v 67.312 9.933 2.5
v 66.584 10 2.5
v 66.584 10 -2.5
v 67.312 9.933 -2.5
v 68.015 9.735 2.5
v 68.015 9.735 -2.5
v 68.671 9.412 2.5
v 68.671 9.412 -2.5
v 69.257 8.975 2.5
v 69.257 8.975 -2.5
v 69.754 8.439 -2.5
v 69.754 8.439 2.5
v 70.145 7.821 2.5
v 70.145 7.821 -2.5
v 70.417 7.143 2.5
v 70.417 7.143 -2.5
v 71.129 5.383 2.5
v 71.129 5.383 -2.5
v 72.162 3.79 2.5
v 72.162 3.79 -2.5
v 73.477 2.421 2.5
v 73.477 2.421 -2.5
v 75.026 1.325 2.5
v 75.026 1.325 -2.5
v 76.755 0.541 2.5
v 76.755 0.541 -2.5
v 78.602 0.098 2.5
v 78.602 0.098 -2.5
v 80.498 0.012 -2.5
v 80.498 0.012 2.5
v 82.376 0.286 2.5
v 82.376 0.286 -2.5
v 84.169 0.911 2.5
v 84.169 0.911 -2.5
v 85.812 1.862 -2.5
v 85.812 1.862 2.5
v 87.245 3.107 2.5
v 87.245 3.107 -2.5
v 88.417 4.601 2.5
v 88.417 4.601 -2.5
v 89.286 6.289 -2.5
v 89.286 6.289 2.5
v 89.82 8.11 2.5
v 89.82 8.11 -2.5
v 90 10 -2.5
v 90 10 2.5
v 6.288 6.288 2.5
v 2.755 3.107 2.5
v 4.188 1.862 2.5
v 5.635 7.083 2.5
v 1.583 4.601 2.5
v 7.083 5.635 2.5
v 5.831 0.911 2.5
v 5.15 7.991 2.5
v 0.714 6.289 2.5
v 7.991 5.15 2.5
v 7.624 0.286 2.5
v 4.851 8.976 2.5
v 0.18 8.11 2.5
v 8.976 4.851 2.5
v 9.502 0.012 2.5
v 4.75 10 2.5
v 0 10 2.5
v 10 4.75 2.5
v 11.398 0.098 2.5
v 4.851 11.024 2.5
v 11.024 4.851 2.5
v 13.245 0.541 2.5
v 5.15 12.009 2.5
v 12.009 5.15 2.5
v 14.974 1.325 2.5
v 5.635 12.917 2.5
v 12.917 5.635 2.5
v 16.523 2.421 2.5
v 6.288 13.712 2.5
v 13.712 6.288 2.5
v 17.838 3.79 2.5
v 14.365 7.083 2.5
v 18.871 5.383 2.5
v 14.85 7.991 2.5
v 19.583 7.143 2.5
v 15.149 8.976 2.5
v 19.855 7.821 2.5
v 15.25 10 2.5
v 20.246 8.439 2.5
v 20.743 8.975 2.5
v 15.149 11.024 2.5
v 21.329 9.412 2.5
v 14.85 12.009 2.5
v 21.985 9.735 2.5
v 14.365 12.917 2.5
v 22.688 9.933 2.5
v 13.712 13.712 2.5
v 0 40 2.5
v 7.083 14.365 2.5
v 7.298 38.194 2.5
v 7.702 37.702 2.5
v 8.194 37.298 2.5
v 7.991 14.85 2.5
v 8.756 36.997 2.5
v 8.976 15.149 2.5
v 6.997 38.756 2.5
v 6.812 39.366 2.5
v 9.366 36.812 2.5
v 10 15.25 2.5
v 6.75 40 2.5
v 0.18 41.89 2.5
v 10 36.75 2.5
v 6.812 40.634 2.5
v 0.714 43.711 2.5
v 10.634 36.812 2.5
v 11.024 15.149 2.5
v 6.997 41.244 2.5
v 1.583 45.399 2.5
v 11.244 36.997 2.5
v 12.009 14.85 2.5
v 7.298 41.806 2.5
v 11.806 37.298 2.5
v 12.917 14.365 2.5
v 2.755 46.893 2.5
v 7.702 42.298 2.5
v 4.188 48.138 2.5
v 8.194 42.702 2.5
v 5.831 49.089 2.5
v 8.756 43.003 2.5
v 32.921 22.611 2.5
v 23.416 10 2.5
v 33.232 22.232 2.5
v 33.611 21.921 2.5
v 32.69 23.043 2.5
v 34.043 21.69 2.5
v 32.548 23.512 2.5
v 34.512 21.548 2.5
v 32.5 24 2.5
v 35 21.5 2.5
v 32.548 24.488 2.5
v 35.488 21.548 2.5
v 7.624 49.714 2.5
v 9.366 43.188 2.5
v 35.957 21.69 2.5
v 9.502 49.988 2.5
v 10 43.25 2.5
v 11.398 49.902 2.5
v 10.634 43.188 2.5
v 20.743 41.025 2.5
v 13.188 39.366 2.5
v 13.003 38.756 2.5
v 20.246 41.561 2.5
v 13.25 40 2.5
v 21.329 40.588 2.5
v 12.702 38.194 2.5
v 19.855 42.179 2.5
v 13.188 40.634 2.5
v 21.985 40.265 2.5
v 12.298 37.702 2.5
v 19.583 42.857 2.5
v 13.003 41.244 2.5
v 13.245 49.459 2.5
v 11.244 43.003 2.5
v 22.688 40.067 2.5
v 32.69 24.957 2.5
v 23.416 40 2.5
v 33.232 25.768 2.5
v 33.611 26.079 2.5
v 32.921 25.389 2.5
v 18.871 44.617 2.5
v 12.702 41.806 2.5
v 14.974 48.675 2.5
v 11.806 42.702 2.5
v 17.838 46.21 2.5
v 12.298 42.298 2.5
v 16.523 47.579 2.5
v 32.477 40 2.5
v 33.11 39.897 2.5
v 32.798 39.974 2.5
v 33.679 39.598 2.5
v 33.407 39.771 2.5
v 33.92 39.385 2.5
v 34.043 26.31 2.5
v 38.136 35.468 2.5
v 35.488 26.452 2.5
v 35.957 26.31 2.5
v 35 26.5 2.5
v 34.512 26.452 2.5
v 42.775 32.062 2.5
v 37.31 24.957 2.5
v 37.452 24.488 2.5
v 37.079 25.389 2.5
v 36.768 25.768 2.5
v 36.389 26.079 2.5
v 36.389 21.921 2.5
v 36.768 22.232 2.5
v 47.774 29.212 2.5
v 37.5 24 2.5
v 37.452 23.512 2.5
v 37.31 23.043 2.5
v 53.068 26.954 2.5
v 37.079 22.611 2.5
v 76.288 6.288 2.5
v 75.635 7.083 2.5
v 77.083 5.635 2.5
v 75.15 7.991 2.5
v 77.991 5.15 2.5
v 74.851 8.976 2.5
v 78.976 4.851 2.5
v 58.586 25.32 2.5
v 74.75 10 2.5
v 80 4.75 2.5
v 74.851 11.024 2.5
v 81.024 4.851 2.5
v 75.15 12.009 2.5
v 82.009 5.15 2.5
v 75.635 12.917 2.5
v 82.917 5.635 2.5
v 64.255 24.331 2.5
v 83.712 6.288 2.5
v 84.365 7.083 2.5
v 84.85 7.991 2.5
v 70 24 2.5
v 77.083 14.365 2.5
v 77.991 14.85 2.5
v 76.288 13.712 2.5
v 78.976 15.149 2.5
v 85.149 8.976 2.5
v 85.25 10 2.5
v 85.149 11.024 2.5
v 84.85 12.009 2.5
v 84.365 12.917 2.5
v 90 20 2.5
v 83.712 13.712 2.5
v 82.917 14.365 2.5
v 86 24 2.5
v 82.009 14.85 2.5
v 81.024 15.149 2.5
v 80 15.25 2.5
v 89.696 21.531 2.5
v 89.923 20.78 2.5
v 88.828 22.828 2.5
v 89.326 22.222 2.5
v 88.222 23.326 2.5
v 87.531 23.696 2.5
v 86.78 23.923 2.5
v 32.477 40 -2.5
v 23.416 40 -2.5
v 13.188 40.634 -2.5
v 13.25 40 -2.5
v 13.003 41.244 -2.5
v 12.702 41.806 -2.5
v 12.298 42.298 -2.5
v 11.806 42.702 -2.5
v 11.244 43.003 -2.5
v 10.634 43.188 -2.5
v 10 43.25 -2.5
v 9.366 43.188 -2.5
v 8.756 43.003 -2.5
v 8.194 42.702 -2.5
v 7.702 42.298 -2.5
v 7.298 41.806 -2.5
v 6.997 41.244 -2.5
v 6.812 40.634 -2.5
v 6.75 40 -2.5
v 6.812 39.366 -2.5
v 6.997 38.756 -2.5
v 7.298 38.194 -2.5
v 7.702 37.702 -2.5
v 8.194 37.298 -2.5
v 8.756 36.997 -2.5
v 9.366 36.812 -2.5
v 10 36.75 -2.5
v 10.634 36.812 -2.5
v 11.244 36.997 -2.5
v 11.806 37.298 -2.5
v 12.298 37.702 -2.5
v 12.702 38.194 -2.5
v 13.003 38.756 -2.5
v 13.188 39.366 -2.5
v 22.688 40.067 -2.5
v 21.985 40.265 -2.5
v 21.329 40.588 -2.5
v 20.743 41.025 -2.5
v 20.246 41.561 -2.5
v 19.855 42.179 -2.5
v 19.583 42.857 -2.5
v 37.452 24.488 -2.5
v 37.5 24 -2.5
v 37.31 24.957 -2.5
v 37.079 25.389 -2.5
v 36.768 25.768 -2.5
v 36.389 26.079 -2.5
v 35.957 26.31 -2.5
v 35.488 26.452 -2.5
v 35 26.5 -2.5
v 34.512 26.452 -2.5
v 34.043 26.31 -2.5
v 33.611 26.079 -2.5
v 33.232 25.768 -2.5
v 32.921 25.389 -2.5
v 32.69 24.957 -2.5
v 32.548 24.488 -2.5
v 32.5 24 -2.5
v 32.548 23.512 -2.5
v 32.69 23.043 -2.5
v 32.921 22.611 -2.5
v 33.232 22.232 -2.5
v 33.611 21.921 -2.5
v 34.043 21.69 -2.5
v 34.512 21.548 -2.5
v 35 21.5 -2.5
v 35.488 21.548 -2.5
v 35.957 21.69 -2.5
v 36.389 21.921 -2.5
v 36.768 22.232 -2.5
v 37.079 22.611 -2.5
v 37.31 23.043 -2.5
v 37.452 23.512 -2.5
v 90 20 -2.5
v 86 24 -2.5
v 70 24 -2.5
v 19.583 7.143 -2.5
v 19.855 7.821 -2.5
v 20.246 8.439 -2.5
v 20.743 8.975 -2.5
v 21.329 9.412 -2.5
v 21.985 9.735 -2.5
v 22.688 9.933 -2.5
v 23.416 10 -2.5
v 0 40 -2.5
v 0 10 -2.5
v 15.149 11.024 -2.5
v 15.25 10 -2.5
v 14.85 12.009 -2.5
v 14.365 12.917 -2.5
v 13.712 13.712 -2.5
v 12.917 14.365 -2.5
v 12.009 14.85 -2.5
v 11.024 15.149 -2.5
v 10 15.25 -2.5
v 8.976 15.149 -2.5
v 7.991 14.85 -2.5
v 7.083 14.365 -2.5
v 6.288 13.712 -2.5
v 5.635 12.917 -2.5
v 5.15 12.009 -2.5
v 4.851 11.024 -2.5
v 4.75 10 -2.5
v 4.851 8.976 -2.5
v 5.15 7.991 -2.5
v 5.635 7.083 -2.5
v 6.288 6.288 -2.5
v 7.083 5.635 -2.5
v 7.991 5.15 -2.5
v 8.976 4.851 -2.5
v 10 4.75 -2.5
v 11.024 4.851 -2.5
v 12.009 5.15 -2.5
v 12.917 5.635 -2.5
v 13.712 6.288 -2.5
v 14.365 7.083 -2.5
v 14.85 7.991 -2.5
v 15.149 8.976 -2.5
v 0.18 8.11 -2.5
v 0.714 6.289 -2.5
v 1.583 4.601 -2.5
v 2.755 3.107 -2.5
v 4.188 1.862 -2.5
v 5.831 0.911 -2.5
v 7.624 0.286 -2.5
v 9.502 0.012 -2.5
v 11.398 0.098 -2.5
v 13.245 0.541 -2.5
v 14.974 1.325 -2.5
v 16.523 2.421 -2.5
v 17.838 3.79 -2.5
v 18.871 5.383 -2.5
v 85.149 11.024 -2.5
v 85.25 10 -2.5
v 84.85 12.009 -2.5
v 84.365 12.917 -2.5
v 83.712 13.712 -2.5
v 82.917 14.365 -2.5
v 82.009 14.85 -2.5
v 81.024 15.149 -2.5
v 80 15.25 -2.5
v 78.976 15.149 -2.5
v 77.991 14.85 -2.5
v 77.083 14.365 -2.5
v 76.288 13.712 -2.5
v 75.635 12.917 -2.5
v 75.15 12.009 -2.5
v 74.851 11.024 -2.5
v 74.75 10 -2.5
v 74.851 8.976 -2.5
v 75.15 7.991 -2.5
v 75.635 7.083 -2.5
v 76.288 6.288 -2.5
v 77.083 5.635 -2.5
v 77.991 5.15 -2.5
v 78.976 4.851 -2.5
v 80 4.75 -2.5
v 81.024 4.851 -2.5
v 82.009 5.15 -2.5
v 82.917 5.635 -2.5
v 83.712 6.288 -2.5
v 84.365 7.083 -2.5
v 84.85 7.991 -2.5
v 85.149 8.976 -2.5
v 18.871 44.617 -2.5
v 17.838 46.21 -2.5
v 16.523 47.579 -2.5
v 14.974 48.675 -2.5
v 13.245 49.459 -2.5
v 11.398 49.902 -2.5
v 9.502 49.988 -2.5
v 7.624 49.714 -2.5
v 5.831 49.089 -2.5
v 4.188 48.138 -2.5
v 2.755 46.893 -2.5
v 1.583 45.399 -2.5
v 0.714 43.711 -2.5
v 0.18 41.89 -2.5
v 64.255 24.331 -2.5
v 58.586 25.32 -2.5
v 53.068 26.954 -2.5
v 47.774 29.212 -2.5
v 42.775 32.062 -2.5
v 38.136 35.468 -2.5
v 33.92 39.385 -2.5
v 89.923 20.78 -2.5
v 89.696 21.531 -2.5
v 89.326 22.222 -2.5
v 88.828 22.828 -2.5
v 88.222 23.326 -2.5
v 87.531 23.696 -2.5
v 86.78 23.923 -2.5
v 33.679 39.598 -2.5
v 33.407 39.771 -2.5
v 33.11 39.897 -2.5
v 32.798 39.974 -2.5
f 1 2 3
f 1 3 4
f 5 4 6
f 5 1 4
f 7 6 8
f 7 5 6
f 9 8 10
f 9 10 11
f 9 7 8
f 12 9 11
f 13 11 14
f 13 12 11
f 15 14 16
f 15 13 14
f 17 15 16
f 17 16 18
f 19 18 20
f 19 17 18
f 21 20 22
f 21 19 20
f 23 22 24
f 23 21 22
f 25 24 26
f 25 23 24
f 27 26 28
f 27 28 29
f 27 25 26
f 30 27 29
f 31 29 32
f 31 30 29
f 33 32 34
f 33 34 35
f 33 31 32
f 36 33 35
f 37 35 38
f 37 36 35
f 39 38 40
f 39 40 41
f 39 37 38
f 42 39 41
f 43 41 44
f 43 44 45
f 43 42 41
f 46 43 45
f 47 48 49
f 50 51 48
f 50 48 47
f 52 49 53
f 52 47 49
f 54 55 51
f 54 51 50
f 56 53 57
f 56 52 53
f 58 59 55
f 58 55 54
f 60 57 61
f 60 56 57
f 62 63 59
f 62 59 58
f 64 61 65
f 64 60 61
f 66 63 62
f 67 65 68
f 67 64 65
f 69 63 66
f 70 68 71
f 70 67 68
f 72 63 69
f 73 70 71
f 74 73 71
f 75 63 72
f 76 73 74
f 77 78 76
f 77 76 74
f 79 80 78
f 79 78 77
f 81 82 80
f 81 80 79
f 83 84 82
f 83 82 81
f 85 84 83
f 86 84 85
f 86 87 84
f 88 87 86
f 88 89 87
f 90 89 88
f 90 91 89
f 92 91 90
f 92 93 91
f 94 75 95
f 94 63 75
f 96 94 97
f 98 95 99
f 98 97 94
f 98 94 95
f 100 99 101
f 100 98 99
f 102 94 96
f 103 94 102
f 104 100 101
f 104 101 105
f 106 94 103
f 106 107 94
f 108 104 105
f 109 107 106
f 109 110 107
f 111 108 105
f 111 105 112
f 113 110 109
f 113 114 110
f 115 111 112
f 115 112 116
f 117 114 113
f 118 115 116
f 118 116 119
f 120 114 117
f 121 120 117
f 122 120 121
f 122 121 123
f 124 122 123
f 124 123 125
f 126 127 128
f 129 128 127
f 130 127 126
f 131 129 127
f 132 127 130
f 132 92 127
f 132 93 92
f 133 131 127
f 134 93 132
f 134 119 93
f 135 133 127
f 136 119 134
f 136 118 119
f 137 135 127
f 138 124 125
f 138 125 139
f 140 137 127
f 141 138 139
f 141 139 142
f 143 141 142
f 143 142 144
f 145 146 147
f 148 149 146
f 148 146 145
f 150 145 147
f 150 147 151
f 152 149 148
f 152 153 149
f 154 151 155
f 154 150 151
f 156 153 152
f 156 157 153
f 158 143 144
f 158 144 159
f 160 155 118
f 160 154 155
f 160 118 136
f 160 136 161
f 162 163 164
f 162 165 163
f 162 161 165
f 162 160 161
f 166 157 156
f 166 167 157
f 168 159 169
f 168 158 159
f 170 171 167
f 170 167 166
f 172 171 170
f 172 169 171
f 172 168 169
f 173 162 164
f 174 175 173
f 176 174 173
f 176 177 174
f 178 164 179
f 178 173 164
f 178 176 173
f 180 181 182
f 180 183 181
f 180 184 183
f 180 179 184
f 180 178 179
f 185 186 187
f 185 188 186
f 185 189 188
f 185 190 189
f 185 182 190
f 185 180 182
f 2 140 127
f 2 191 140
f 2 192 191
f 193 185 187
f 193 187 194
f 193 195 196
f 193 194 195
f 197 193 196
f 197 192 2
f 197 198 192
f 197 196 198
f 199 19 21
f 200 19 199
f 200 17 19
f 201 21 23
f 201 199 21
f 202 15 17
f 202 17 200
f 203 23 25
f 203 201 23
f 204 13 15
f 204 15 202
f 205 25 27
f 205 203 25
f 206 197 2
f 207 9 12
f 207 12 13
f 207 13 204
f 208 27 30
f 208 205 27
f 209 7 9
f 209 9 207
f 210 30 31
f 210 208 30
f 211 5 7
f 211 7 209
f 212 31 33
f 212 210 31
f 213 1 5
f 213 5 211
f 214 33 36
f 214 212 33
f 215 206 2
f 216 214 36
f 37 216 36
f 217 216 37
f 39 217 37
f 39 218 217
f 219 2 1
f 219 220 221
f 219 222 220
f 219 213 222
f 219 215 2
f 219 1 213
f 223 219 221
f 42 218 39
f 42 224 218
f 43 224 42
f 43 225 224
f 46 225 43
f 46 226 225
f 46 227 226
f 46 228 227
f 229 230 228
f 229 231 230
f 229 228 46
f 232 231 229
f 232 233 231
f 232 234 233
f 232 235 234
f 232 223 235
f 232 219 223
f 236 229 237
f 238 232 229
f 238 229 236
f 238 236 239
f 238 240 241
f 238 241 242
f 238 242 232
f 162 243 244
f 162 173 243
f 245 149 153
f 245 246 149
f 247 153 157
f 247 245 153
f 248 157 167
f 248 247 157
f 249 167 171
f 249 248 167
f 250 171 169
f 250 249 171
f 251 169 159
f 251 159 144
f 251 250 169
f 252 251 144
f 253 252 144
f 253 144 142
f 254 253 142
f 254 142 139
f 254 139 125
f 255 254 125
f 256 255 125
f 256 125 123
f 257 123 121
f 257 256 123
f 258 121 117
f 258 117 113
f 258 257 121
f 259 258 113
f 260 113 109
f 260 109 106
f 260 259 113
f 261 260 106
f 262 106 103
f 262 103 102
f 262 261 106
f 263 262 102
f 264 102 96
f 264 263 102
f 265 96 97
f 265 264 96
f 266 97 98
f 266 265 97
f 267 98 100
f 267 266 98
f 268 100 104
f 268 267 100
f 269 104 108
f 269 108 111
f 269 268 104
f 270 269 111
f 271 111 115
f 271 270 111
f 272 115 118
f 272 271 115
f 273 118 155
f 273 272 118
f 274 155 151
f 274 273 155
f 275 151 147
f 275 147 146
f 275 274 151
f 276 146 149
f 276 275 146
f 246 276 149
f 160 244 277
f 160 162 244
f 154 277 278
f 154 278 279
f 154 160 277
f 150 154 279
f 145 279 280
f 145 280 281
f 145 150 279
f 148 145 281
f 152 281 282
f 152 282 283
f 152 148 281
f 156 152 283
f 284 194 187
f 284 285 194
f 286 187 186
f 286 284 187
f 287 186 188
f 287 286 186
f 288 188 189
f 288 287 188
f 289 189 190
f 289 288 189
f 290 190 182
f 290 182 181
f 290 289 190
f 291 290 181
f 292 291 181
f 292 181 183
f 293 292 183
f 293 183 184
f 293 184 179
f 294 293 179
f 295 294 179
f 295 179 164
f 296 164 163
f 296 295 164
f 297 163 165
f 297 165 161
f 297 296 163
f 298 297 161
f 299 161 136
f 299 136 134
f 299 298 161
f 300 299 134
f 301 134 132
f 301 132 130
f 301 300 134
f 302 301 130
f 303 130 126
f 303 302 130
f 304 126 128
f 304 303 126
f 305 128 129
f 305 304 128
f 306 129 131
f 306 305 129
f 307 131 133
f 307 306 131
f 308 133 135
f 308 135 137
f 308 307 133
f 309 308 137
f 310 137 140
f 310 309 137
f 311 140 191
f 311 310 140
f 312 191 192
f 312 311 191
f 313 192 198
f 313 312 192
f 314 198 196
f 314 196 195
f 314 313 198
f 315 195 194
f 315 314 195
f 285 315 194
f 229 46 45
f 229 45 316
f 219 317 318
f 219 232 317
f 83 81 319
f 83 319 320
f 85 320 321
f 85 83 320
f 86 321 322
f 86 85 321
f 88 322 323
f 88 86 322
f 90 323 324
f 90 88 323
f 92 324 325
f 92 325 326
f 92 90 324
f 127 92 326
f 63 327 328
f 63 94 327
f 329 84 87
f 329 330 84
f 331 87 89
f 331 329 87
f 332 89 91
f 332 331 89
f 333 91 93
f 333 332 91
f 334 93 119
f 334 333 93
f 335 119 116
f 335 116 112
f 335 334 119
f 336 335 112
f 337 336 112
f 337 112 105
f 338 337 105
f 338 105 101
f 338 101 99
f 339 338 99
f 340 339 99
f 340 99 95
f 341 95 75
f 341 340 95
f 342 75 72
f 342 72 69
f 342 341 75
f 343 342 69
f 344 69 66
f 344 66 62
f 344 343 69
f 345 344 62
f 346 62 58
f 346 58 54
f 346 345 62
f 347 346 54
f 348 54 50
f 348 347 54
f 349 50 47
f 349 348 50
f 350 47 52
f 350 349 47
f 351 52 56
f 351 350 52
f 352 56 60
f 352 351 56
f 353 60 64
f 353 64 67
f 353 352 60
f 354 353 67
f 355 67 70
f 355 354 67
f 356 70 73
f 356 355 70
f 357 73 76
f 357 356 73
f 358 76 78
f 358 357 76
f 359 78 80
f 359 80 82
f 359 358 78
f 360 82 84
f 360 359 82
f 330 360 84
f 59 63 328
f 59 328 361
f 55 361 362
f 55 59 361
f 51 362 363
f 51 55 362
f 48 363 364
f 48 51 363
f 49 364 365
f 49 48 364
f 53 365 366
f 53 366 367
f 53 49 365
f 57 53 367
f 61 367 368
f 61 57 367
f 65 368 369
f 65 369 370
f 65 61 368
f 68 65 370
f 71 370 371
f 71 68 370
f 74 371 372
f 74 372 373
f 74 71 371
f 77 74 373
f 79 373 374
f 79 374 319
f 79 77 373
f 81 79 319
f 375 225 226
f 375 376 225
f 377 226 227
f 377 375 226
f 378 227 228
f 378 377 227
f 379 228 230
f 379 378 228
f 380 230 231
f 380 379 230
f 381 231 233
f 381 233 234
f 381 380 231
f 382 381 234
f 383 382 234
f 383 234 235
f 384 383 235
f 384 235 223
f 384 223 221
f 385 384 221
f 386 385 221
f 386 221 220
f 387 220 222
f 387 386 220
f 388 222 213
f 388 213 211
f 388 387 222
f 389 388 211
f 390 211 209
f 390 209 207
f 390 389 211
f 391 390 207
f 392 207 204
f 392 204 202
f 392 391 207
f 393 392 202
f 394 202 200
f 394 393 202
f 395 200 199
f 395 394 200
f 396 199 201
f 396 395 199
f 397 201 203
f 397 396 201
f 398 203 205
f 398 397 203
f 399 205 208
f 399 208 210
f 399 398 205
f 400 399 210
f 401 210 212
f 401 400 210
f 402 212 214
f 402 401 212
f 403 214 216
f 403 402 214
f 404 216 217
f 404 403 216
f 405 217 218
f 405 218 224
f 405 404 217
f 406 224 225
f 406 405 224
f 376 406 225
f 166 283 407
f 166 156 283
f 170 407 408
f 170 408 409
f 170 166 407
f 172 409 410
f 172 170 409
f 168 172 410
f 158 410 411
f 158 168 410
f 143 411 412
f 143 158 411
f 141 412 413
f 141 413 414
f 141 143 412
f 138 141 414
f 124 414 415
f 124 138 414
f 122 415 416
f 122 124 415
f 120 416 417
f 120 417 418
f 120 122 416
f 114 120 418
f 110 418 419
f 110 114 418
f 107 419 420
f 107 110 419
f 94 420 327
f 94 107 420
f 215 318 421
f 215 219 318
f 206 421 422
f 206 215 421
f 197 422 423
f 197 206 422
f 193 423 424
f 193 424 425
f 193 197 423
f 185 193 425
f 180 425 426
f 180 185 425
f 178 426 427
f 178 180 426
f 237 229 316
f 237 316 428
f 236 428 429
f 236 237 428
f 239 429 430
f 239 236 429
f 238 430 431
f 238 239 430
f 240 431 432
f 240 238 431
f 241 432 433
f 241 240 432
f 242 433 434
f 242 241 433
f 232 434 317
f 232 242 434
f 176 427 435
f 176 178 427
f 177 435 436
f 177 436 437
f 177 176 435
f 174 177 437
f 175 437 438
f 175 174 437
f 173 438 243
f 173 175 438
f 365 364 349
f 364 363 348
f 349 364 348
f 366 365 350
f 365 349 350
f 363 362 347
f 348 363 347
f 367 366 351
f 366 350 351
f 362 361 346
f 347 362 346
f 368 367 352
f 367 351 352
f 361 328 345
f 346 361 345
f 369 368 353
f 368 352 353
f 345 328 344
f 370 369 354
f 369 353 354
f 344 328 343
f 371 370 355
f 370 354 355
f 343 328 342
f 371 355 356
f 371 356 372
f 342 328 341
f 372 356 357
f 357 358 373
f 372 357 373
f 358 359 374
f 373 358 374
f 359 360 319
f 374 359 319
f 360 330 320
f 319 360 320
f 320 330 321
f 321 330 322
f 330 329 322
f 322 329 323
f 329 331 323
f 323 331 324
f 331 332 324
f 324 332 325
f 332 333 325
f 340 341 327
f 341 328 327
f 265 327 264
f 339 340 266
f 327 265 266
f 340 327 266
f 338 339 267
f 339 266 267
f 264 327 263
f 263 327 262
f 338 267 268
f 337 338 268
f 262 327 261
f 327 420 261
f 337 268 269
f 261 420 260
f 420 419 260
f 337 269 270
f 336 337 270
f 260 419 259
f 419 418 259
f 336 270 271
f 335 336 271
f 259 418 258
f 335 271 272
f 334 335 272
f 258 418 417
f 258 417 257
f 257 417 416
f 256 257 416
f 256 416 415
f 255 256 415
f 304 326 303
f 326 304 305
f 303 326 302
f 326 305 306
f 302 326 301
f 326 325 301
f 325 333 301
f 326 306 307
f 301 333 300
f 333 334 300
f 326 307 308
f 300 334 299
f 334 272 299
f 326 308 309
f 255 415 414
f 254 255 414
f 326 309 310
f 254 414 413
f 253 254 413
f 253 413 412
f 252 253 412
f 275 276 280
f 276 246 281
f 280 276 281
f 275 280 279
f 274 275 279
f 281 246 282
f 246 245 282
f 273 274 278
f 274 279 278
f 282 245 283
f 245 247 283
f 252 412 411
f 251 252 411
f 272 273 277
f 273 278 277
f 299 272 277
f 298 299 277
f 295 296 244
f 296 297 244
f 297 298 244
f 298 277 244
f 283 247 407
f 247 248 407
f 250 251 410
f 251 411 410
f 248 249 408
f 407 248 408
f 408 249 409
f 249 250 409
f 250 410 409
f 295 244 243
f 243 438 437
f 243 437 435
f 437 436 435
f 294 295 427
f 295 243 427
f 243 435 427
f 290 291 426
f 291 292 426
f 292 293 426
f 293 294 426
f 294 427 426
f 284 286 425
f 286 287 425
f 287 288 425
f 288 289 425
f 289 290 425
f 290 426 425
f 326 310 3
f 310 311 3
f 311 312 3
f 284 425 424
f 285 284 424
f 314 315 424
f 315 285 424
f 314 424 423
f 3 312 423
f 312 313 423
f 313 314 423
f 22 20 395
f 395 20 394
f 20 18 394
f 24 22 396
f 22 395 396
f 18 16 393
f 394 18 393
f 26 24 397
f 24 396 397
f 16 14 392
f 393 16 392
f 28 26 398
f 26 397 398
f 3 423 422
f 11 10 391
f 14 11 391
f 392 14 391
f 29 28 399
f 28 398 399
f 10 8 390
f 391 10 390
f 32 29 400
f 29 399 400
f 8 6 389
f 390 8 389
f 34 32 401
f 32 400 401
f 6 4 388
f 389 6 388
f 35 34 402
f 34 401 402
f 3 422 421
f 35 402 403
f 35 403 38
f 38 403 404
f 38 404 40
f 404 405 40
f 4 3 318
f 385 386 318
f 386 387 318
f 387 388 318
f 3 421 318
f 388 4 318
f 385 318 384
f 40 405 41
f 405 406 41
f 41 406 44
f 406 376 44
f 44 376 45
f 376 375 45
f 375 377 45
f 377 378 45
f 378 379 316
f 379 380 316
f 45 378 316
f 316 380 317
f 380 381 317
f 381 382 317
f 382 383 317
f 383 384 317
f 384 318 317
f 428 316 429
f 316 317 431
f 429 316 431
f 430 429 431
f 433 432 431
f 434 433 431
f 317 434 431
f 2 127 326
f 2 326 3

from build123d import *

# Parameters (mm, degrees)
SKETCH2_R           = 3.25
SKETCH2_R_2         = 5.25
SKETCH2_R_3         = 2.5
BOSS_EXTRUDE1_DEPTH = 2.5


with BuildPart() as part:
    # Sketch2 → Boss-Extrude1 (new, symmetric)
    with BuildSketch(Plane.XY):
        with BuildLine():
            Line((0, 40), (0, 10))
            ThreePointArc((0, 10), (8.556304179, 0.104761631), (19.583148475, 7.142857143))
            ThreePointArc((19.583148475, 7.142857143), (21.025950646, 9.207134903), (23.416407865, 10))
            Line((23.416407865, 10), (66.583592135, 10))
            ThreePointArc((66.583592135, 10), (68.974049354, 9.207134903), (70.416851525, 7.142857143))
            ThreePointArc((70.416851525, 7.142857143), (81.443695821, 0.104761631), (90, 10))
            Line((90, 10), (90, 20))
            ThreePointArc((90, 20), (88.828427125, 22.828427125), (86, 24))
            Line((86, 24), (70, 24))
            ThreePointArc((70, 24), (50.388386486, 28.00668945), (33.919878771, 39.384615385))
            ThreePointArc((33.919878771, 39.384615385), (33.261138462, 39.839732422), (32.476673921, 40))
            Line((32.476673921, 40), (23.416407865, 40))
            ThreePointArc((23.416407865, 40), (21.025950646, 40.792865097), (19.583148475, 42.857142857))
            ThreePointArc((19.583148475, 42.857142857), (8.556304179, 49.895238369), (0, 40))
        make_face()
        with Locations((10, 40)):
            Circle(SKETCH2_R, mode=Mode.SUBTRACT)
        with Locations((10, 10)):
            Circle(SKETCH2_R_2, mode=Mode.SUBTRACT)
        with Locations((80, 10)):
            Circle(SKETCH2_R_2, mode=Mode.SUBTRACT)
        with Locations((35, 24)):
            Circle(SKETCH2_R_3, mode=Mode.SUBTRACT)
    extrude(amount=BOSS_EXTRUDE1_DEPTH, both=True)


solid = part.part
